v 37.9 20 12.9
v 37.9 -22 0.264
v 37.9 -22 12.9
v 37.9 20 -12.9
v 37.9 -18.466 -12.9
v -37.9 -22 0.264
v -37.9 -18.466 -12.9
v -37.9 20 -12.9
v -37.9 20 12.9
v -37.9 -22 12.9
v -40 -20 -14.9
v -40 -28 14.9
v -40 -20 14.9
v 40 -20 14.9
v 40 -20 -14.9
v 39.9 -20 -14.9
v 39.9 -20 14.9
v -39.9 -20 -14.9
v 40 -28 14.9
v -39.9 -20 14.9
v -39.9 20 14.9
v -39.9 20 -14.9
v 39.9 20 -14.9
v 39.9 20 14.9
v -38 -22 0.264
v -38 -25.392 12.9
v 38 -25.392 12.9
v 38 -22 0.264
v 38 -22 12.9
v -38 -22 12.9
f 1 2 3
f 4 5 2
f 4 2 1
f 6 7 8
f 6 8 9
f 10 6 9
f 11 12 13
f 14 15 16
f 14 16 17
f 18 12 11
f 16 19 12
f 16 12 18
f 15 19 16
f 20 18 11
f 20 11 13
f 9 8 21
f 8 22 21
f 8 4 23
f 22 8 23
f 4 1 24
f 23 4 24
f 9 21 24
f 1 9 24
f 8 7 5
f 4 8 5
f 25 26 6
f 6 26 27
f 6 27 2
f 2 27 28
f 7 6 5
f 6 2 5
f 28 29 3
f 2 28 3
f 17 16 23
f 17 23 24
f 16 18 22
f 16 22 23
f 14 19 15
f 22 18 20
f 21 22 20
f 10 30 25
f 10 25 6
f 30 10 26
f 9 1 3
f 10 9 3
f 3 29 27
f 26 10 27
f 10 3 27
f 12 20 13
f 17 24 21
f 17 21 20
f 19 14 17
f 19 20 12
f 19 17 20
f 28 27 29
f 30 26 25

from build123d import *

# Parameters (mm, degrees)
F0_W        = 79.8
F0_H        = 29.8
F1_DEPTH    = 20
F3_DEPTH    = 40
F4_T        = 2
F4_T3_DEPTH = 33.8


# Not quite as in the source:
# - a shell that OpenCascade refuses in one call is made with other operations: the cavity is built on its own and cut out


with BuildPart() as f1:
    # F0 (on Front) → F1 (new body, symmetric)
    with BuildSketch(Plane.XZ):
        Rectangle(F0_W, F0_H)
    extrude(amount=F1_DEPTH, both=True)

    # F2 (on Right) → F3 (join, symmetric)
    with BuildSketch(Plane.YZ):
        Polygon((-28, 14.9), (-20, -14.9), (-20, 14.9), align=None)
    extrude(amount=F3_DEPTH, both=True)

    # F4: shell of thickness 2, made by hand


with BuildPart() as f4_core1:
    # F4_t2: copy of F1
    add(f1.part)

    # the walls: a layer under each face that stays
    f4_faces = [f4_core1.faces().sort_by_distance(p)[0] for p in [
        (0, -24, 0),
        (-40, -24, 9.9333333333),
        (-39.95, -20, 0),
        (0, 0, -14.9),
        (39.95, -20, 0),
        (40, -24, 9.9333333333),
        (0, -4, 14.9),
        (-39.9, 0, 0),
        (39.9, 0, 0),
    ]]
    thicken(f4_faces, amount=-F4_T, mode=Mode.SUBTRACT)

    # F4_s4 → F4_t3 (cut)
    with BuildSketch(Plane.XY.offset(-16.9)):
        Polygon((-39.92, -19.98), (-39.9, -22), (-37.9, -22), (-37.9, -20), align=None)
        Polygon((39.92, -19.98), (39.9, -22), (37.9, -22), (37.9, -20), align=None)
    extrude(amount=F4_T3_DEPTH, mode=Mode.SUBTRACT)


with BuildPart() as f1_1:
    add(f1.part)

    # what is left inside the walls is the cavity
    f4_cavity = [f4_core1.part.solids().sort_by_distance(p)[0] for p in [
        (-12.666667, -2.696136, 12.88),
    ]]
    add(f4_cavity, mode=Mode.SUBTRACT)


solid = f1_1.part
